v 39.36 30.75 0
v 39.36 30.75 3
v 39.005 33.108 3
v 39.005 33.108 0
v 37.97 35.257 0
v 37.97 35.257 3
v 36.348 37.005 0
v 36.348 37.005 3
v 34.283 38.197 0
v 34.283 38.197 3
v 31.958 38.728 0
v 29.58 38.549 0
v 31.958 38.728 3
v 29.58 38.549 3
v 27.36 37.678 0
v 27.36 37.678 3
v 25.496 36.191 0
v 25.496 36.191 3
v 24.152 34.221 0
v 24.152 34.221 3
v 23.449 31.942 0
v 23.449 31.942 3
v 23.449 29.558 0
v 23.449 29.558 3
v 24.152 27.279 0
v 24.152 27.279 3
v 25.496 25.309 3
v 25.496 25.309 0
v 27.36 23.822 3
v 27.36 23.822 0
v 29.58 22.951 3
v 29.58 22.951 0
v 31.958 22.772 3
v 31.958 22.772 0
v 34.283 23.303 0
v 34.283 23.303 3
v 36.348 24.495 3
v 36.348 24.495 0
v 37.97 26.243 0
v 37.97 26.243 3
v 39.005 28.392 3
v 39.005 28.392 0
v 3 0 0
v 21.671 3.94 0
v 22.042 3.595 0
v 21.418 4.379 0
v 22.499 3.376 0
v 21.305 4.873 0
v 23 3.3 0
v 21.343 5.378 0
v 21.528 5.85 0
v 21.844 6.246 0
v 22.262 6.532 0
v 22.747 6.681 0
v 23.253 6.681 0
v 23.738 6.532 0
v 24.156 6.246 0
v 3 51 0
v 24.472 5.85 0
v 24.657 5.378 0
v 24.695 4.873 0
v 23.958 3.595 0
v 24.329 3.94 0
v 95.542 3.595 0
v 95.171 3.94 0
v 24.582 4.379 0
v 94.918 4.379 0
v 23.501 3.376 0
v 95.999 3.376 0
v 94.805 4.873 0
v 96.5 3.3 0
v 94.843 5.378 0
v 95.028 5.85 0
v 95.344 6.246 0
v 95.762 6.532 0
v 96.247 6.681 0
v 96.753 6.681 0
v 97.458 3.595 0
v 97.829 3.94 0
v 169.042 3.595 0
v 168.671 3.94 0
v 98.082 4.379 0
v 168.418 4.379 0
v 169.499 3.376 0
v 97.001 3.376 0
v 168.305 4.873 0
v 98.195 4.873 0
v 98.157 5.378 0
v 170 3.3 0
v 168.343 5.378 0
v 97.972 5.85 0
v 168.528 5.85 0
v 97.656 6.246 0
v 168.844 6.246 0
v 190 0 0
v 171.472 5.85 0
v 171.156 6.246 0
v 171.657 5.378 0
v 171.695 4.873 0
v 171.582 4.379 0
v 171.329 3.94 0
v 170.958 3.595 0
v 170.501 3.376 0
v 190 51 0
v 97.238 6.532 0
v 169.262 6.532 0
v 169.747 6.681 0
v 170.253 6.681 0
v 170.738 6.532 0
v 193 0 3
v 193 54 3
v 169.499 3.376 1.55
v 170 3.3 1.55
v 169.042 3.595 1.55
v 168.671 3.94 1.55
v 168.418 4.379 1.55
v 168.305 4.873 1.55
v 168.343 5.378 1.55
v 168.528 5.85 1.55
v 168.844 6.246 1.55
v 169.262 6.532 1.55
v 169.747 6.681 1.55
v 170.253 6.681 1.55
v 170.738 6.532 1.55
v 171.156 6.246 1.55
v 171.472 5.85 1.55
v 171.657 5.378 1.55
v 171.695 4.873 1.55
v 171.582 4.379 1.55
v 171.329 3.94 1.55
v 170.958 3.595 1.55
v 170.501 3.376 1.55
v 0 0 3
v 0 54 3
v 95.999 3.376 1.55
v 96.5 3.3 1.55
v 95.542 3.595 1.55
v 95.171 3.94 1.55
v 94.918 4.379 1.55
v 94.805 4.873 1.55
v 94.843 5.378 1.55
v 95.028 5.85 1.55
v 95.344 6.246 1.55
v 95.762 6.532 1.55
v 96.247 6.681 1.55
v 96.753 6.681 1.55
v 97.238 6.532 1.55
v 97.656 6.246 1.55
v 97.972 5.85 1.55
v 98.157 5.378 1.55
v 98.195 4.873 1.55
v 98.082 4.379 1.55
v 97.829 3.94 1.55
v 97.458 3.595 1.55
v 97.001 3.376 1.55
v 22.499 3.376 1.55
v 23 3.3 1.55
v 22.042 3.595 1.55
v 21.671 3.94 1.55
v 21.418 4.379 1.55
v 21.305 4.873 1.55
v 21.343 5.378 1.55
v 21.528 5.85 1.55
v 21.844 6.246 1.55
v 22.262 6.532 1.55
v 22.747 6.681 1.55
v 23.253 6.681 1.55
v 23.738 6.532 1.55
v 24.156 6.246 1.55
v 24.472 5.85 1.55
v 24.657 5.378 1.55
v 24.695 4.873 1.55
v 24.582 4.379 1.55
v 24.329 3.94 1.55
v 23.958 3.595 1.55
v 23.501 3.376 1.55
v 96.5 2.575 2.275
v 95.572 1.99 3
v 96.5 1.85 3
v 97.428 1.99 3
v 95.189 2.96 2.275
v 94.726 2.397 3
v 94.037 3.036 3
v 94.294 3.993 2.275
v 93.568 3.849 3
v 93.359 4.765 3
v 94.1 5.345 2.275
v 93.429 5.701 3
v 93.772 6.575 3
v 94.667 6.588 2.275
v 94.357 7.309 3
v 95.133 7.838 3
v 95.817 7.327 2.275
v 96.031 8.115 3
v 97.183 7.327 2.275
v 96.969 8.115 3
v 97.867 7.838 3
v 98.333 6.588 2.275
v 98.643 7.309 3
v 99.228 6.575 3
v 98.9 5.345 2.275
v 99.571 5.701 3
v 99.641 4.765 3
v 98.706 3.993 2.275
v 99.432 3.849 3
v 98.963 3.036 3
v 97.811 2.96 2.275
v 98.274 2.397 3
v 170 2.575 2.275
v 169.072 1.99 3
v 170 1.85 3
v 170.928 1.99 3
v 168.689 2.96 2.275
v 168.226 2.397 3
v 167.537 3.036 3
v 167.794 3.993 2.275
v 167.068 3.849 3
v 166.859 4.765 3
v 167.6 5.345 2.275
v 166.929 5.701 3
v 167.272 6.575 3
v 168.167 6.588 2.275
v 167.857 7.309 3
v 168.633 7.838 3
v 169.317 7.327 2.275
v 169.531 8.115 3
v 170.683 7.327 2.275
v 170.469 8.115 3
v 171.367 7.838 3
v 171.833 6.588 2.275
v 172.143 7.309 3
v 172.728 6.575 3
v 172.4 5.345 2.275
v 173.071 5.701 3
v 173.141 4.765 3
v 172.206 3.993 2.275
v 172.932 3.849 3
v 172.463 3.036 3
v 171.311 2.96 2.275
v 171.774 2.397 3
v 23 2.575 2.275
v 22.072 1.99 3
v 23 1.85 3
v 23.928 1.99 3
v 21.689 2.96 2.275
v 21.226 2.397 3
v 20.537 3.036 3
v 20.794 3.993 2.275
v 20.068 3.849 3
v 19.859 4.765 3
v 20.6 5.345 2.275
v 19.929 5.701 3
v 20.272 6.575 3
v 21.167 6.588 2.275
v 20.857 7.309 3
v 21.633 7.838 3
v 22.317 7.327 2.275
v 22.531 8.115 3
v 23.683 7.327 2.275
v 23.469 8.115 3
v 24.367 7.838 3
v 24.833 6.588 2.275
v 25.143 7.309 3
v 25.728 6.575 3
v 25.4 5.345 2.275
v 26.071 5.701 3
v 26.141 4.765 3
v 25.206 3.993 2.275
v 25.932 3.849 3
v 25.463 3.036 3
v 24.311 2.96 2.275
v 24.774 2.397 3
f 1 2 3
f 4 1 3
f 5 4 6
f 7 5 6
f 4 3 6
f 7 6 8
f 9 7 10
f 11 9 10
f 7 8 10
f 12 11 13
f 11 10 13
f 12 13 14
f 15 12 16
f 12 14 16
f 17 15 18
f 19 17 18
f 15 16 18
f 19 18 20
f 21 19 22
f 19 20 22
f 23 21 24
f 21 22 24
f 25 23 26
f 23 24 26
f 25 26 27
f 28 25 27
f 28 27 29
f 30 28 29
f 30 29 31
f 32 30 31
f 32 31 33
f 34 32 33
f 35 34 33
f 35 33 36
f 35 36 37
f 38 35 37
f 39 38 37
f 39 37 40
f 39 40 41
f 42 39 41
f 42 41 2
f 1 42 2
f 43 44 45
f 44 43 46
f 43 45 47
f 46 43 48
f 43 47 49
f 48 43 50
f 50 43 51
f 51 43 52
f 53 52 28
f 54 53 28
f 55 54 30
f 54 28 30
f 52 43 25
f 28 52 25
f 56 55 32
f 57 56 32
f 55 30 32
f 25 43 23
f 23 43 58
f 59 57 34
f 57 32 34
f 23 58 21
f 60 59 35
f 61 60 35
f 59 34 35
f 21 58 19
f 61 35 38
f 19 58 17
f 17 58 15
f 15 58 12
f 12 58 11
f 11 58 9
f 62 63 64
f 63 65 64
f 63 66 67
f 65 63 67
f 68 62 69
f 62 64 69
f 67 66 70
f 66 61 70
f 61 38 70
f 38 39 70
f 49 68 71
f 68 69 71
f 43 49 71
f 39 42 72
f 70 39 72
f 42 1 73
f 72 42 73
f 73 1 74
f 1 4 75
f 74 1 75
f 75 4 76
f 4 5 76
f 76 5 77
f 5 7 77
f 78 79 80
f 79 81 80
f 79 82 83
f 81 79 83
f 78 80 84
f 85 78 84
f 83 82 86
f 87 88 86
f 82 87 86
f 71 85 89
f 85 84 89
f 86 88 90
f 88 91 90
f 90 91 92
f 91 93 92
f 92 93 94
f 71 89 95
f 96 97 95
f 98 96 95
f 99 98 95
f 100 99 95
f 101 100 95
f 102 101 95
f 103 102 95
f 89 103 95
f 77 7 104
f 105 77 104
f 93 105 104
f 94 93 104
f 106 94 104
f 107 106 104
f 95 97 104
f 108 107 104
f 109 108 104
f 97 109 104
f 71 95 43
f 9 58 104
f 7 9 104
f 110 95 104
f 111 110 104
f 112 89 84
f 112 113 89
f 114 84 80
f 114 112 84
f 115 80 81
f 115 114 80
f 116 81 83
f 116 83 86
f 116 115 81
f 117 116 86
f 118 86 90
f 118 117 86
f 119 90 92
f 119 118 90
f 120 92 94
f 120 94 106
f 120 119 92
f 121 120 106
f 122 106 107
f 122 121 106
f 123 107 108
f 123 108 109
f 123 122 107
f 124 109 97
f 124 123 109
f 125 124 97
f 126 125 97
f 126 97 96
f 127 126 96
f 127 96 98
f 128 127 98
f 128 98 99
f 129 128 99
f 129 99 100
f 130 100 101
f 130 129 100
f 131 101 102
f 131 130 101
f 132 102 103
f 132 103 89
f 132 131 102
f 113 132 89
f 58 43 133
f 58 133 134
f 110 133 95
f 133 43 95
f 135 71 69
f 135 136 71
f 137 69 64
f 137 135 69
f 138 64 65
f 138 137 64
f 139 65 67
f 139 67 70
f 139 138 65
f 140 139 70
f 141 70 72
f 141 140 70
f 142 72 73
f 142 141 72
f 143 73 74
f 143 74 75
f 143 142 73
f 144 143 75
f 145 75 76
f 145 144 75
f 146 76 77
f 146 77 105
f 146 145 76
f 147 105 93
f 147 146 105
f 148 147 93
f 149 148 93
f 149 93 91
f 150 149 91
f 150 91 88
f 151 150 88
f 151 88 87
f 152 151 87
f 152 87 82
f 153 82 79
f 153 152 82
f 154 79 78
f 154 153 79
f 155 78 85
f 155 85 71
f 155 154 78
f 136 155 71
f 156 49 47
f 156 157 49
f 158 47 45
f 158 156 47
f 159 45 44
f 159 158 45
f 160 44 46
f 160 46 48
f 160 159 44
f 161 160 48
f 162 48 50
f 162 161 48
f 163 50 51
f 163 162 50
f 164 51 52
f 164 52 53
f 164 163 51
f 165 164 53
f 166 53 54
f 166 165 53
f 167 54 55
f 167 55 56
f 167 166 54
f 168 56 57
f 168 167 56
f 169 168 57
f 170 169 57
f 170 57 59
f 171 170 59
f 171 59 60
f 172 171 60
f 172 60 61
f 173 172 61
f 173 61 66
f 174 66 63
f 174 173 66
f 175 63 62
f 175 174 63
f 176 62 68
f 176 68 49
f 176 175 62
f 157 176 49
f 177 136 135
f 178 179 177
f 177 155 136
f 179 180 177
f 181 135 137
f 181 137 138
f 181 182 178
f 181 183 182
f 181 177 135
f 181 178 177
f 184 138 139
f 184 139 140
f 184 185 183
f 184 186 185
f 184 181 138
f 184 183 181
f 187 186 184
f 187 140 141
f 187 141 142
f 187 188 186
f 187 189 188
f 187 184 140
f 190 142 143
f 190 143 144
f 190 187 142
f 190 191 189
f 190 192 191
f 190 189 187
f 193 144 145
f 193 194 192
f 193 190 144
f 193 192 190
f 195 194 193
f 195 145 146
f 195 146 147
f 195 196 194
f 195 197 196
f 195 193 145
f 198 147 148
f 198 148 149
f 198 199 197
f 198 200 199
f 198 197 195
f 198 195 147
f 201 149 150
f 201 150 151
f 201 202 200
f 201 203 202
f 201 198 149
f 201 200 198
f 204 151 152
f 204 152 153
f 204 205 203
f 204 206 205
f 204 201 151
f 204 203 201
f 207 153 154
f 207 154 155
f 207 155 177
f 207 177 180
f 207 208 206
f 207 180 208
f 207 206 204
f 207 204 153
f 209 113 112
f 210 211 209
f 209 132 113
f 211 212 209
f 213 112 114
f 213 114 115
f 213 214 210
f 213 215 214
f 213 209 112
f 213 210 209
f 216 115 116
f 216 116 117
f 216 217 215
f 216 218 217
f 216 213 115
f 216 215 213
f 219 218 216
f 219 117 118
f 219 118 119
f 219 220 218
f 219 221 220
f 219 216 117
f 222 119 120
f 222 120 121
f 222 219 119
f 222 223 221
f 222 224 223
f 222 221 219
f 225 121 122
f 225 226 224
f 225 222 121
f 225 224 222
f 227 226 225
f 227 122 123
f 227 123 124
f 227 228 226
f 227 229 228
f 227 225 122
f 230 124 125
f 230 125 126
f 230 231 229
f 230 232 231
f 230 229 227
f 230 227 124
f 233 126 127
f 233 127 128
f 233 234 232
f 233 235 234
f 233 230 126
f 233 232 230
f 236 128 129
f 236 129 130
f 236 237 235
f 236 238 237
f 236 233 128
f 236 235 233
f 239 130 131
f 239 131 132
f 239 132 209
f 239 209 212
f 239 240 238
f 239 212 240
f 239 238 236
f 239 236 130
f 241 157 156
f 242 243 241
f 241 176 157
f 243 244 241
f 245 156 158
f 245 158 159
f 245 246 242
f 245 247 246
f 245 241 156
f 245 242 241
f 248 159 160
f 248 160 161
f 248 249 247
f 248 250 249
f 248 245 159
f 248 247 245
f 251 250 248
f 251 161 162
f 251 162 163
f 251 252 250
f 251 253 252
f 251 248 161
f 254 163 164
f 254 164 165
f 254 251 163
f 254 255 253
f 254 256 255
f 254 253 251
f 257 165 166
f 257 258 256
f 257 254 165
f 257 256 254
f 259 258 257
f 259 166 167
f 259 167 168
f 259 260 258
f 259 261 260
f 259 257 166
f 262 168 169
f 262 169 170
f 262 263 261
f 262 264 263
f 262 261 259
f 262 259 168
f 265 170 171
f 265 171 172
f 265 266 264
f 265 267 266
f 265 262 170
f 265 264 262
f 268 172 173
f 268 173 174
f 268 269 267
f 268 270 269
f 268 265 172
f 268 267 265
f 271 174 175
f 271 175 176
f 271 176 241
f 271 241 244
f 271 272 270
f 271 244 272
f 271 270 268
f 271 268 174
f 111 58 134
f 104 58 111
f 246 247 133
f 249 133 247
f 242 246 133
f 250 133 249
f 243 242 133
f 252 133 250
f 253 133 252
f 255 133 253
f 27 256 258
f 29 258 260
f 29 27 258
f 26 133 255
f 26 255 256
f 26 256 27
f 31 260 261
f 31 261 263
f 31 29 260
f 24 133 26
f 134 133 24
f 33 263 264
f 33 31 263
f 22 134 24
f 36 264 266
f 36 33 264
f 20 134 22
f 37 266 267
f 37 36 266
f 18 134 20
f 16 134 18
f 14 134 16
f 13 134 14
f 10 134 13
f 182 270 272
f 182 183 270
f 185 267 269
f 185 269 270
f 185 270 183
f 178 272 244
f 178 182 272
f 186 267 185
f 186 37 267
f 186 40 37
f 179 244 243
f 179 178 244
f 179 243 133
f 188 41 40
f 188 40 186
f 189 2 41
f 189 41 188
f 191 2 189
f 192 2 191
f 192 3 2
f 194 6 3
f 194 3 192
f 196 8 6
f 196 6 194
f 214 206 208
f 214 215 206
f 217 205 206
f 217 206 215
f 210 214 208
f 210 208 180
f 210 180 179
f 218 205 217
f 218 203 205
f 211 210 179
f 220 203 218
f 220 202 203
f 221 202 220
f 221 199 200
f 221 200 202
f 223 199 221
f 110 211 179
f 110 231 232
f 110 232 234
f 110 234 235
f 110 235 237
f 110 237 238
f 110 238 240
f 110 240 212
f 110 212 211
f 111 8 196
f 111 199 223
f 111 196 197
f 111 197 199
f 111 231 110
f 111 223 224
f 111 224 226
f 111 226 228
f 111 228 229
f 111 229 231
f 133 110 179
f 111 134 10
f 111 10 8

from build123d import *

# Parameters (mm, degrees)
SKETCH1_W                                      = 193
SKETCH1_H                                      = 54
BOSS_EXTRUDE1_DEPTH                            = 3
CHAMFER1_SIZE                                  = 3
CSK_FOR_M3_FLAT_HEAD_MACHINE_SCREW1_AT_2_COUNT = 2
CSK_FOR_M3_FLAT_HEAD_MACHINE_SCREW1_AT_2_PITCH = 73.5
CSK_FOR_M3_FLAT_HEAD_MACHINE_SCREW1_AT_3_COUNT = 2
CSK_FOR_M3_FLAT_HEAD_MACHINE_SCREW1_AT_3_PITCH = 147
SKETCH5_R                                      = 8
CUT_EXTRUDE1_DEPTH                             = 10


with BuildPart() as part:
    # Sketch1 → Boss-Extrude1 (new body)
    with BuildSketch(Plane.XY):
        with Locations((96.5, 27)):
            Rectangle(SKETCH1_W, SKETCH1_H)
    extrude(amount=BOSS_EXTRUDE1_DEPTH)

    # Chamfer1
    chamfer1_edges = [part.edges().sort_by_distance(p)[0] for p in [
        (0, 27, 0),
        (96.5, 54, 0),
        (193, 27, 0),
    ]]
    chamfer(chamfer1_edges, length=CHAMFER1_SIZE - 0.0001)  # a hair under: the kernel refuses the full size

    # Sketch3 → CSK for M3 Flat Head Machine Screw1 (revolve, cut)
    with BuildSketch(Plane(origin=(23, 5, 3), x_dir=(0, -1, 0), z_dir=(1, 0, 0))):
        Polygon((0, 0), (0, 3), (1.7, 3), (1.7, 1.45), (3.15, 0), align=None)
    csk_for_m3_flat_head_machine_screw1 = revolve(axis=Axis((23, 5, 9.35), (0, 0, -1)), mode=Mode.SUBTRACT)

    # CSK for M3 Flat Head Machine Screw1 at 2: CSK for M3 Flat Head Machine Screw1 ×2
    with Locations(*[(i * CSK_FOR_M3_FLAT_HEAD_MACHINE_SCREW1_AT_2_PITCH, 0, 0) for i in range(1, CSK_FOR_M3_FLAT_HEAD_MACHINE_SCREW1_AT_2_COUNT)]):
        add(csk_for_m3_flat_head_machine_screw1, mode=Mode.SUBTRACT)

    # CSK for M3 Flat Head Machine Screw1 at 3: CSK for M3 Flat Head Machine Screw1 ×2
    with Locations(*[(i * CSK_FOR_M3_FLAT_HEAD_MACHINE_SCREW1_AT_3_PITCH, 0, 0) for i in range(1, CSK_FOR_M3_FLAT_HEAD_MACHINE_SCREW1_AT_3_COUNT)]):
        add(csk_for_m3_flat_head_machine_screw1, mode=Mode.SUBTRACT)

    # Sketch5 → Cut-Extrude1 (cut)
    with BuildSketch(Plane.XY.offset(3)):
        with Locations((31.36, 30.75)):
            Circle(SKETCH5_R)
    extrude(amount=-CUT_EXTRUDE1_DEPTH, mode=Mode.SUBTRACT)


solid = part.part
